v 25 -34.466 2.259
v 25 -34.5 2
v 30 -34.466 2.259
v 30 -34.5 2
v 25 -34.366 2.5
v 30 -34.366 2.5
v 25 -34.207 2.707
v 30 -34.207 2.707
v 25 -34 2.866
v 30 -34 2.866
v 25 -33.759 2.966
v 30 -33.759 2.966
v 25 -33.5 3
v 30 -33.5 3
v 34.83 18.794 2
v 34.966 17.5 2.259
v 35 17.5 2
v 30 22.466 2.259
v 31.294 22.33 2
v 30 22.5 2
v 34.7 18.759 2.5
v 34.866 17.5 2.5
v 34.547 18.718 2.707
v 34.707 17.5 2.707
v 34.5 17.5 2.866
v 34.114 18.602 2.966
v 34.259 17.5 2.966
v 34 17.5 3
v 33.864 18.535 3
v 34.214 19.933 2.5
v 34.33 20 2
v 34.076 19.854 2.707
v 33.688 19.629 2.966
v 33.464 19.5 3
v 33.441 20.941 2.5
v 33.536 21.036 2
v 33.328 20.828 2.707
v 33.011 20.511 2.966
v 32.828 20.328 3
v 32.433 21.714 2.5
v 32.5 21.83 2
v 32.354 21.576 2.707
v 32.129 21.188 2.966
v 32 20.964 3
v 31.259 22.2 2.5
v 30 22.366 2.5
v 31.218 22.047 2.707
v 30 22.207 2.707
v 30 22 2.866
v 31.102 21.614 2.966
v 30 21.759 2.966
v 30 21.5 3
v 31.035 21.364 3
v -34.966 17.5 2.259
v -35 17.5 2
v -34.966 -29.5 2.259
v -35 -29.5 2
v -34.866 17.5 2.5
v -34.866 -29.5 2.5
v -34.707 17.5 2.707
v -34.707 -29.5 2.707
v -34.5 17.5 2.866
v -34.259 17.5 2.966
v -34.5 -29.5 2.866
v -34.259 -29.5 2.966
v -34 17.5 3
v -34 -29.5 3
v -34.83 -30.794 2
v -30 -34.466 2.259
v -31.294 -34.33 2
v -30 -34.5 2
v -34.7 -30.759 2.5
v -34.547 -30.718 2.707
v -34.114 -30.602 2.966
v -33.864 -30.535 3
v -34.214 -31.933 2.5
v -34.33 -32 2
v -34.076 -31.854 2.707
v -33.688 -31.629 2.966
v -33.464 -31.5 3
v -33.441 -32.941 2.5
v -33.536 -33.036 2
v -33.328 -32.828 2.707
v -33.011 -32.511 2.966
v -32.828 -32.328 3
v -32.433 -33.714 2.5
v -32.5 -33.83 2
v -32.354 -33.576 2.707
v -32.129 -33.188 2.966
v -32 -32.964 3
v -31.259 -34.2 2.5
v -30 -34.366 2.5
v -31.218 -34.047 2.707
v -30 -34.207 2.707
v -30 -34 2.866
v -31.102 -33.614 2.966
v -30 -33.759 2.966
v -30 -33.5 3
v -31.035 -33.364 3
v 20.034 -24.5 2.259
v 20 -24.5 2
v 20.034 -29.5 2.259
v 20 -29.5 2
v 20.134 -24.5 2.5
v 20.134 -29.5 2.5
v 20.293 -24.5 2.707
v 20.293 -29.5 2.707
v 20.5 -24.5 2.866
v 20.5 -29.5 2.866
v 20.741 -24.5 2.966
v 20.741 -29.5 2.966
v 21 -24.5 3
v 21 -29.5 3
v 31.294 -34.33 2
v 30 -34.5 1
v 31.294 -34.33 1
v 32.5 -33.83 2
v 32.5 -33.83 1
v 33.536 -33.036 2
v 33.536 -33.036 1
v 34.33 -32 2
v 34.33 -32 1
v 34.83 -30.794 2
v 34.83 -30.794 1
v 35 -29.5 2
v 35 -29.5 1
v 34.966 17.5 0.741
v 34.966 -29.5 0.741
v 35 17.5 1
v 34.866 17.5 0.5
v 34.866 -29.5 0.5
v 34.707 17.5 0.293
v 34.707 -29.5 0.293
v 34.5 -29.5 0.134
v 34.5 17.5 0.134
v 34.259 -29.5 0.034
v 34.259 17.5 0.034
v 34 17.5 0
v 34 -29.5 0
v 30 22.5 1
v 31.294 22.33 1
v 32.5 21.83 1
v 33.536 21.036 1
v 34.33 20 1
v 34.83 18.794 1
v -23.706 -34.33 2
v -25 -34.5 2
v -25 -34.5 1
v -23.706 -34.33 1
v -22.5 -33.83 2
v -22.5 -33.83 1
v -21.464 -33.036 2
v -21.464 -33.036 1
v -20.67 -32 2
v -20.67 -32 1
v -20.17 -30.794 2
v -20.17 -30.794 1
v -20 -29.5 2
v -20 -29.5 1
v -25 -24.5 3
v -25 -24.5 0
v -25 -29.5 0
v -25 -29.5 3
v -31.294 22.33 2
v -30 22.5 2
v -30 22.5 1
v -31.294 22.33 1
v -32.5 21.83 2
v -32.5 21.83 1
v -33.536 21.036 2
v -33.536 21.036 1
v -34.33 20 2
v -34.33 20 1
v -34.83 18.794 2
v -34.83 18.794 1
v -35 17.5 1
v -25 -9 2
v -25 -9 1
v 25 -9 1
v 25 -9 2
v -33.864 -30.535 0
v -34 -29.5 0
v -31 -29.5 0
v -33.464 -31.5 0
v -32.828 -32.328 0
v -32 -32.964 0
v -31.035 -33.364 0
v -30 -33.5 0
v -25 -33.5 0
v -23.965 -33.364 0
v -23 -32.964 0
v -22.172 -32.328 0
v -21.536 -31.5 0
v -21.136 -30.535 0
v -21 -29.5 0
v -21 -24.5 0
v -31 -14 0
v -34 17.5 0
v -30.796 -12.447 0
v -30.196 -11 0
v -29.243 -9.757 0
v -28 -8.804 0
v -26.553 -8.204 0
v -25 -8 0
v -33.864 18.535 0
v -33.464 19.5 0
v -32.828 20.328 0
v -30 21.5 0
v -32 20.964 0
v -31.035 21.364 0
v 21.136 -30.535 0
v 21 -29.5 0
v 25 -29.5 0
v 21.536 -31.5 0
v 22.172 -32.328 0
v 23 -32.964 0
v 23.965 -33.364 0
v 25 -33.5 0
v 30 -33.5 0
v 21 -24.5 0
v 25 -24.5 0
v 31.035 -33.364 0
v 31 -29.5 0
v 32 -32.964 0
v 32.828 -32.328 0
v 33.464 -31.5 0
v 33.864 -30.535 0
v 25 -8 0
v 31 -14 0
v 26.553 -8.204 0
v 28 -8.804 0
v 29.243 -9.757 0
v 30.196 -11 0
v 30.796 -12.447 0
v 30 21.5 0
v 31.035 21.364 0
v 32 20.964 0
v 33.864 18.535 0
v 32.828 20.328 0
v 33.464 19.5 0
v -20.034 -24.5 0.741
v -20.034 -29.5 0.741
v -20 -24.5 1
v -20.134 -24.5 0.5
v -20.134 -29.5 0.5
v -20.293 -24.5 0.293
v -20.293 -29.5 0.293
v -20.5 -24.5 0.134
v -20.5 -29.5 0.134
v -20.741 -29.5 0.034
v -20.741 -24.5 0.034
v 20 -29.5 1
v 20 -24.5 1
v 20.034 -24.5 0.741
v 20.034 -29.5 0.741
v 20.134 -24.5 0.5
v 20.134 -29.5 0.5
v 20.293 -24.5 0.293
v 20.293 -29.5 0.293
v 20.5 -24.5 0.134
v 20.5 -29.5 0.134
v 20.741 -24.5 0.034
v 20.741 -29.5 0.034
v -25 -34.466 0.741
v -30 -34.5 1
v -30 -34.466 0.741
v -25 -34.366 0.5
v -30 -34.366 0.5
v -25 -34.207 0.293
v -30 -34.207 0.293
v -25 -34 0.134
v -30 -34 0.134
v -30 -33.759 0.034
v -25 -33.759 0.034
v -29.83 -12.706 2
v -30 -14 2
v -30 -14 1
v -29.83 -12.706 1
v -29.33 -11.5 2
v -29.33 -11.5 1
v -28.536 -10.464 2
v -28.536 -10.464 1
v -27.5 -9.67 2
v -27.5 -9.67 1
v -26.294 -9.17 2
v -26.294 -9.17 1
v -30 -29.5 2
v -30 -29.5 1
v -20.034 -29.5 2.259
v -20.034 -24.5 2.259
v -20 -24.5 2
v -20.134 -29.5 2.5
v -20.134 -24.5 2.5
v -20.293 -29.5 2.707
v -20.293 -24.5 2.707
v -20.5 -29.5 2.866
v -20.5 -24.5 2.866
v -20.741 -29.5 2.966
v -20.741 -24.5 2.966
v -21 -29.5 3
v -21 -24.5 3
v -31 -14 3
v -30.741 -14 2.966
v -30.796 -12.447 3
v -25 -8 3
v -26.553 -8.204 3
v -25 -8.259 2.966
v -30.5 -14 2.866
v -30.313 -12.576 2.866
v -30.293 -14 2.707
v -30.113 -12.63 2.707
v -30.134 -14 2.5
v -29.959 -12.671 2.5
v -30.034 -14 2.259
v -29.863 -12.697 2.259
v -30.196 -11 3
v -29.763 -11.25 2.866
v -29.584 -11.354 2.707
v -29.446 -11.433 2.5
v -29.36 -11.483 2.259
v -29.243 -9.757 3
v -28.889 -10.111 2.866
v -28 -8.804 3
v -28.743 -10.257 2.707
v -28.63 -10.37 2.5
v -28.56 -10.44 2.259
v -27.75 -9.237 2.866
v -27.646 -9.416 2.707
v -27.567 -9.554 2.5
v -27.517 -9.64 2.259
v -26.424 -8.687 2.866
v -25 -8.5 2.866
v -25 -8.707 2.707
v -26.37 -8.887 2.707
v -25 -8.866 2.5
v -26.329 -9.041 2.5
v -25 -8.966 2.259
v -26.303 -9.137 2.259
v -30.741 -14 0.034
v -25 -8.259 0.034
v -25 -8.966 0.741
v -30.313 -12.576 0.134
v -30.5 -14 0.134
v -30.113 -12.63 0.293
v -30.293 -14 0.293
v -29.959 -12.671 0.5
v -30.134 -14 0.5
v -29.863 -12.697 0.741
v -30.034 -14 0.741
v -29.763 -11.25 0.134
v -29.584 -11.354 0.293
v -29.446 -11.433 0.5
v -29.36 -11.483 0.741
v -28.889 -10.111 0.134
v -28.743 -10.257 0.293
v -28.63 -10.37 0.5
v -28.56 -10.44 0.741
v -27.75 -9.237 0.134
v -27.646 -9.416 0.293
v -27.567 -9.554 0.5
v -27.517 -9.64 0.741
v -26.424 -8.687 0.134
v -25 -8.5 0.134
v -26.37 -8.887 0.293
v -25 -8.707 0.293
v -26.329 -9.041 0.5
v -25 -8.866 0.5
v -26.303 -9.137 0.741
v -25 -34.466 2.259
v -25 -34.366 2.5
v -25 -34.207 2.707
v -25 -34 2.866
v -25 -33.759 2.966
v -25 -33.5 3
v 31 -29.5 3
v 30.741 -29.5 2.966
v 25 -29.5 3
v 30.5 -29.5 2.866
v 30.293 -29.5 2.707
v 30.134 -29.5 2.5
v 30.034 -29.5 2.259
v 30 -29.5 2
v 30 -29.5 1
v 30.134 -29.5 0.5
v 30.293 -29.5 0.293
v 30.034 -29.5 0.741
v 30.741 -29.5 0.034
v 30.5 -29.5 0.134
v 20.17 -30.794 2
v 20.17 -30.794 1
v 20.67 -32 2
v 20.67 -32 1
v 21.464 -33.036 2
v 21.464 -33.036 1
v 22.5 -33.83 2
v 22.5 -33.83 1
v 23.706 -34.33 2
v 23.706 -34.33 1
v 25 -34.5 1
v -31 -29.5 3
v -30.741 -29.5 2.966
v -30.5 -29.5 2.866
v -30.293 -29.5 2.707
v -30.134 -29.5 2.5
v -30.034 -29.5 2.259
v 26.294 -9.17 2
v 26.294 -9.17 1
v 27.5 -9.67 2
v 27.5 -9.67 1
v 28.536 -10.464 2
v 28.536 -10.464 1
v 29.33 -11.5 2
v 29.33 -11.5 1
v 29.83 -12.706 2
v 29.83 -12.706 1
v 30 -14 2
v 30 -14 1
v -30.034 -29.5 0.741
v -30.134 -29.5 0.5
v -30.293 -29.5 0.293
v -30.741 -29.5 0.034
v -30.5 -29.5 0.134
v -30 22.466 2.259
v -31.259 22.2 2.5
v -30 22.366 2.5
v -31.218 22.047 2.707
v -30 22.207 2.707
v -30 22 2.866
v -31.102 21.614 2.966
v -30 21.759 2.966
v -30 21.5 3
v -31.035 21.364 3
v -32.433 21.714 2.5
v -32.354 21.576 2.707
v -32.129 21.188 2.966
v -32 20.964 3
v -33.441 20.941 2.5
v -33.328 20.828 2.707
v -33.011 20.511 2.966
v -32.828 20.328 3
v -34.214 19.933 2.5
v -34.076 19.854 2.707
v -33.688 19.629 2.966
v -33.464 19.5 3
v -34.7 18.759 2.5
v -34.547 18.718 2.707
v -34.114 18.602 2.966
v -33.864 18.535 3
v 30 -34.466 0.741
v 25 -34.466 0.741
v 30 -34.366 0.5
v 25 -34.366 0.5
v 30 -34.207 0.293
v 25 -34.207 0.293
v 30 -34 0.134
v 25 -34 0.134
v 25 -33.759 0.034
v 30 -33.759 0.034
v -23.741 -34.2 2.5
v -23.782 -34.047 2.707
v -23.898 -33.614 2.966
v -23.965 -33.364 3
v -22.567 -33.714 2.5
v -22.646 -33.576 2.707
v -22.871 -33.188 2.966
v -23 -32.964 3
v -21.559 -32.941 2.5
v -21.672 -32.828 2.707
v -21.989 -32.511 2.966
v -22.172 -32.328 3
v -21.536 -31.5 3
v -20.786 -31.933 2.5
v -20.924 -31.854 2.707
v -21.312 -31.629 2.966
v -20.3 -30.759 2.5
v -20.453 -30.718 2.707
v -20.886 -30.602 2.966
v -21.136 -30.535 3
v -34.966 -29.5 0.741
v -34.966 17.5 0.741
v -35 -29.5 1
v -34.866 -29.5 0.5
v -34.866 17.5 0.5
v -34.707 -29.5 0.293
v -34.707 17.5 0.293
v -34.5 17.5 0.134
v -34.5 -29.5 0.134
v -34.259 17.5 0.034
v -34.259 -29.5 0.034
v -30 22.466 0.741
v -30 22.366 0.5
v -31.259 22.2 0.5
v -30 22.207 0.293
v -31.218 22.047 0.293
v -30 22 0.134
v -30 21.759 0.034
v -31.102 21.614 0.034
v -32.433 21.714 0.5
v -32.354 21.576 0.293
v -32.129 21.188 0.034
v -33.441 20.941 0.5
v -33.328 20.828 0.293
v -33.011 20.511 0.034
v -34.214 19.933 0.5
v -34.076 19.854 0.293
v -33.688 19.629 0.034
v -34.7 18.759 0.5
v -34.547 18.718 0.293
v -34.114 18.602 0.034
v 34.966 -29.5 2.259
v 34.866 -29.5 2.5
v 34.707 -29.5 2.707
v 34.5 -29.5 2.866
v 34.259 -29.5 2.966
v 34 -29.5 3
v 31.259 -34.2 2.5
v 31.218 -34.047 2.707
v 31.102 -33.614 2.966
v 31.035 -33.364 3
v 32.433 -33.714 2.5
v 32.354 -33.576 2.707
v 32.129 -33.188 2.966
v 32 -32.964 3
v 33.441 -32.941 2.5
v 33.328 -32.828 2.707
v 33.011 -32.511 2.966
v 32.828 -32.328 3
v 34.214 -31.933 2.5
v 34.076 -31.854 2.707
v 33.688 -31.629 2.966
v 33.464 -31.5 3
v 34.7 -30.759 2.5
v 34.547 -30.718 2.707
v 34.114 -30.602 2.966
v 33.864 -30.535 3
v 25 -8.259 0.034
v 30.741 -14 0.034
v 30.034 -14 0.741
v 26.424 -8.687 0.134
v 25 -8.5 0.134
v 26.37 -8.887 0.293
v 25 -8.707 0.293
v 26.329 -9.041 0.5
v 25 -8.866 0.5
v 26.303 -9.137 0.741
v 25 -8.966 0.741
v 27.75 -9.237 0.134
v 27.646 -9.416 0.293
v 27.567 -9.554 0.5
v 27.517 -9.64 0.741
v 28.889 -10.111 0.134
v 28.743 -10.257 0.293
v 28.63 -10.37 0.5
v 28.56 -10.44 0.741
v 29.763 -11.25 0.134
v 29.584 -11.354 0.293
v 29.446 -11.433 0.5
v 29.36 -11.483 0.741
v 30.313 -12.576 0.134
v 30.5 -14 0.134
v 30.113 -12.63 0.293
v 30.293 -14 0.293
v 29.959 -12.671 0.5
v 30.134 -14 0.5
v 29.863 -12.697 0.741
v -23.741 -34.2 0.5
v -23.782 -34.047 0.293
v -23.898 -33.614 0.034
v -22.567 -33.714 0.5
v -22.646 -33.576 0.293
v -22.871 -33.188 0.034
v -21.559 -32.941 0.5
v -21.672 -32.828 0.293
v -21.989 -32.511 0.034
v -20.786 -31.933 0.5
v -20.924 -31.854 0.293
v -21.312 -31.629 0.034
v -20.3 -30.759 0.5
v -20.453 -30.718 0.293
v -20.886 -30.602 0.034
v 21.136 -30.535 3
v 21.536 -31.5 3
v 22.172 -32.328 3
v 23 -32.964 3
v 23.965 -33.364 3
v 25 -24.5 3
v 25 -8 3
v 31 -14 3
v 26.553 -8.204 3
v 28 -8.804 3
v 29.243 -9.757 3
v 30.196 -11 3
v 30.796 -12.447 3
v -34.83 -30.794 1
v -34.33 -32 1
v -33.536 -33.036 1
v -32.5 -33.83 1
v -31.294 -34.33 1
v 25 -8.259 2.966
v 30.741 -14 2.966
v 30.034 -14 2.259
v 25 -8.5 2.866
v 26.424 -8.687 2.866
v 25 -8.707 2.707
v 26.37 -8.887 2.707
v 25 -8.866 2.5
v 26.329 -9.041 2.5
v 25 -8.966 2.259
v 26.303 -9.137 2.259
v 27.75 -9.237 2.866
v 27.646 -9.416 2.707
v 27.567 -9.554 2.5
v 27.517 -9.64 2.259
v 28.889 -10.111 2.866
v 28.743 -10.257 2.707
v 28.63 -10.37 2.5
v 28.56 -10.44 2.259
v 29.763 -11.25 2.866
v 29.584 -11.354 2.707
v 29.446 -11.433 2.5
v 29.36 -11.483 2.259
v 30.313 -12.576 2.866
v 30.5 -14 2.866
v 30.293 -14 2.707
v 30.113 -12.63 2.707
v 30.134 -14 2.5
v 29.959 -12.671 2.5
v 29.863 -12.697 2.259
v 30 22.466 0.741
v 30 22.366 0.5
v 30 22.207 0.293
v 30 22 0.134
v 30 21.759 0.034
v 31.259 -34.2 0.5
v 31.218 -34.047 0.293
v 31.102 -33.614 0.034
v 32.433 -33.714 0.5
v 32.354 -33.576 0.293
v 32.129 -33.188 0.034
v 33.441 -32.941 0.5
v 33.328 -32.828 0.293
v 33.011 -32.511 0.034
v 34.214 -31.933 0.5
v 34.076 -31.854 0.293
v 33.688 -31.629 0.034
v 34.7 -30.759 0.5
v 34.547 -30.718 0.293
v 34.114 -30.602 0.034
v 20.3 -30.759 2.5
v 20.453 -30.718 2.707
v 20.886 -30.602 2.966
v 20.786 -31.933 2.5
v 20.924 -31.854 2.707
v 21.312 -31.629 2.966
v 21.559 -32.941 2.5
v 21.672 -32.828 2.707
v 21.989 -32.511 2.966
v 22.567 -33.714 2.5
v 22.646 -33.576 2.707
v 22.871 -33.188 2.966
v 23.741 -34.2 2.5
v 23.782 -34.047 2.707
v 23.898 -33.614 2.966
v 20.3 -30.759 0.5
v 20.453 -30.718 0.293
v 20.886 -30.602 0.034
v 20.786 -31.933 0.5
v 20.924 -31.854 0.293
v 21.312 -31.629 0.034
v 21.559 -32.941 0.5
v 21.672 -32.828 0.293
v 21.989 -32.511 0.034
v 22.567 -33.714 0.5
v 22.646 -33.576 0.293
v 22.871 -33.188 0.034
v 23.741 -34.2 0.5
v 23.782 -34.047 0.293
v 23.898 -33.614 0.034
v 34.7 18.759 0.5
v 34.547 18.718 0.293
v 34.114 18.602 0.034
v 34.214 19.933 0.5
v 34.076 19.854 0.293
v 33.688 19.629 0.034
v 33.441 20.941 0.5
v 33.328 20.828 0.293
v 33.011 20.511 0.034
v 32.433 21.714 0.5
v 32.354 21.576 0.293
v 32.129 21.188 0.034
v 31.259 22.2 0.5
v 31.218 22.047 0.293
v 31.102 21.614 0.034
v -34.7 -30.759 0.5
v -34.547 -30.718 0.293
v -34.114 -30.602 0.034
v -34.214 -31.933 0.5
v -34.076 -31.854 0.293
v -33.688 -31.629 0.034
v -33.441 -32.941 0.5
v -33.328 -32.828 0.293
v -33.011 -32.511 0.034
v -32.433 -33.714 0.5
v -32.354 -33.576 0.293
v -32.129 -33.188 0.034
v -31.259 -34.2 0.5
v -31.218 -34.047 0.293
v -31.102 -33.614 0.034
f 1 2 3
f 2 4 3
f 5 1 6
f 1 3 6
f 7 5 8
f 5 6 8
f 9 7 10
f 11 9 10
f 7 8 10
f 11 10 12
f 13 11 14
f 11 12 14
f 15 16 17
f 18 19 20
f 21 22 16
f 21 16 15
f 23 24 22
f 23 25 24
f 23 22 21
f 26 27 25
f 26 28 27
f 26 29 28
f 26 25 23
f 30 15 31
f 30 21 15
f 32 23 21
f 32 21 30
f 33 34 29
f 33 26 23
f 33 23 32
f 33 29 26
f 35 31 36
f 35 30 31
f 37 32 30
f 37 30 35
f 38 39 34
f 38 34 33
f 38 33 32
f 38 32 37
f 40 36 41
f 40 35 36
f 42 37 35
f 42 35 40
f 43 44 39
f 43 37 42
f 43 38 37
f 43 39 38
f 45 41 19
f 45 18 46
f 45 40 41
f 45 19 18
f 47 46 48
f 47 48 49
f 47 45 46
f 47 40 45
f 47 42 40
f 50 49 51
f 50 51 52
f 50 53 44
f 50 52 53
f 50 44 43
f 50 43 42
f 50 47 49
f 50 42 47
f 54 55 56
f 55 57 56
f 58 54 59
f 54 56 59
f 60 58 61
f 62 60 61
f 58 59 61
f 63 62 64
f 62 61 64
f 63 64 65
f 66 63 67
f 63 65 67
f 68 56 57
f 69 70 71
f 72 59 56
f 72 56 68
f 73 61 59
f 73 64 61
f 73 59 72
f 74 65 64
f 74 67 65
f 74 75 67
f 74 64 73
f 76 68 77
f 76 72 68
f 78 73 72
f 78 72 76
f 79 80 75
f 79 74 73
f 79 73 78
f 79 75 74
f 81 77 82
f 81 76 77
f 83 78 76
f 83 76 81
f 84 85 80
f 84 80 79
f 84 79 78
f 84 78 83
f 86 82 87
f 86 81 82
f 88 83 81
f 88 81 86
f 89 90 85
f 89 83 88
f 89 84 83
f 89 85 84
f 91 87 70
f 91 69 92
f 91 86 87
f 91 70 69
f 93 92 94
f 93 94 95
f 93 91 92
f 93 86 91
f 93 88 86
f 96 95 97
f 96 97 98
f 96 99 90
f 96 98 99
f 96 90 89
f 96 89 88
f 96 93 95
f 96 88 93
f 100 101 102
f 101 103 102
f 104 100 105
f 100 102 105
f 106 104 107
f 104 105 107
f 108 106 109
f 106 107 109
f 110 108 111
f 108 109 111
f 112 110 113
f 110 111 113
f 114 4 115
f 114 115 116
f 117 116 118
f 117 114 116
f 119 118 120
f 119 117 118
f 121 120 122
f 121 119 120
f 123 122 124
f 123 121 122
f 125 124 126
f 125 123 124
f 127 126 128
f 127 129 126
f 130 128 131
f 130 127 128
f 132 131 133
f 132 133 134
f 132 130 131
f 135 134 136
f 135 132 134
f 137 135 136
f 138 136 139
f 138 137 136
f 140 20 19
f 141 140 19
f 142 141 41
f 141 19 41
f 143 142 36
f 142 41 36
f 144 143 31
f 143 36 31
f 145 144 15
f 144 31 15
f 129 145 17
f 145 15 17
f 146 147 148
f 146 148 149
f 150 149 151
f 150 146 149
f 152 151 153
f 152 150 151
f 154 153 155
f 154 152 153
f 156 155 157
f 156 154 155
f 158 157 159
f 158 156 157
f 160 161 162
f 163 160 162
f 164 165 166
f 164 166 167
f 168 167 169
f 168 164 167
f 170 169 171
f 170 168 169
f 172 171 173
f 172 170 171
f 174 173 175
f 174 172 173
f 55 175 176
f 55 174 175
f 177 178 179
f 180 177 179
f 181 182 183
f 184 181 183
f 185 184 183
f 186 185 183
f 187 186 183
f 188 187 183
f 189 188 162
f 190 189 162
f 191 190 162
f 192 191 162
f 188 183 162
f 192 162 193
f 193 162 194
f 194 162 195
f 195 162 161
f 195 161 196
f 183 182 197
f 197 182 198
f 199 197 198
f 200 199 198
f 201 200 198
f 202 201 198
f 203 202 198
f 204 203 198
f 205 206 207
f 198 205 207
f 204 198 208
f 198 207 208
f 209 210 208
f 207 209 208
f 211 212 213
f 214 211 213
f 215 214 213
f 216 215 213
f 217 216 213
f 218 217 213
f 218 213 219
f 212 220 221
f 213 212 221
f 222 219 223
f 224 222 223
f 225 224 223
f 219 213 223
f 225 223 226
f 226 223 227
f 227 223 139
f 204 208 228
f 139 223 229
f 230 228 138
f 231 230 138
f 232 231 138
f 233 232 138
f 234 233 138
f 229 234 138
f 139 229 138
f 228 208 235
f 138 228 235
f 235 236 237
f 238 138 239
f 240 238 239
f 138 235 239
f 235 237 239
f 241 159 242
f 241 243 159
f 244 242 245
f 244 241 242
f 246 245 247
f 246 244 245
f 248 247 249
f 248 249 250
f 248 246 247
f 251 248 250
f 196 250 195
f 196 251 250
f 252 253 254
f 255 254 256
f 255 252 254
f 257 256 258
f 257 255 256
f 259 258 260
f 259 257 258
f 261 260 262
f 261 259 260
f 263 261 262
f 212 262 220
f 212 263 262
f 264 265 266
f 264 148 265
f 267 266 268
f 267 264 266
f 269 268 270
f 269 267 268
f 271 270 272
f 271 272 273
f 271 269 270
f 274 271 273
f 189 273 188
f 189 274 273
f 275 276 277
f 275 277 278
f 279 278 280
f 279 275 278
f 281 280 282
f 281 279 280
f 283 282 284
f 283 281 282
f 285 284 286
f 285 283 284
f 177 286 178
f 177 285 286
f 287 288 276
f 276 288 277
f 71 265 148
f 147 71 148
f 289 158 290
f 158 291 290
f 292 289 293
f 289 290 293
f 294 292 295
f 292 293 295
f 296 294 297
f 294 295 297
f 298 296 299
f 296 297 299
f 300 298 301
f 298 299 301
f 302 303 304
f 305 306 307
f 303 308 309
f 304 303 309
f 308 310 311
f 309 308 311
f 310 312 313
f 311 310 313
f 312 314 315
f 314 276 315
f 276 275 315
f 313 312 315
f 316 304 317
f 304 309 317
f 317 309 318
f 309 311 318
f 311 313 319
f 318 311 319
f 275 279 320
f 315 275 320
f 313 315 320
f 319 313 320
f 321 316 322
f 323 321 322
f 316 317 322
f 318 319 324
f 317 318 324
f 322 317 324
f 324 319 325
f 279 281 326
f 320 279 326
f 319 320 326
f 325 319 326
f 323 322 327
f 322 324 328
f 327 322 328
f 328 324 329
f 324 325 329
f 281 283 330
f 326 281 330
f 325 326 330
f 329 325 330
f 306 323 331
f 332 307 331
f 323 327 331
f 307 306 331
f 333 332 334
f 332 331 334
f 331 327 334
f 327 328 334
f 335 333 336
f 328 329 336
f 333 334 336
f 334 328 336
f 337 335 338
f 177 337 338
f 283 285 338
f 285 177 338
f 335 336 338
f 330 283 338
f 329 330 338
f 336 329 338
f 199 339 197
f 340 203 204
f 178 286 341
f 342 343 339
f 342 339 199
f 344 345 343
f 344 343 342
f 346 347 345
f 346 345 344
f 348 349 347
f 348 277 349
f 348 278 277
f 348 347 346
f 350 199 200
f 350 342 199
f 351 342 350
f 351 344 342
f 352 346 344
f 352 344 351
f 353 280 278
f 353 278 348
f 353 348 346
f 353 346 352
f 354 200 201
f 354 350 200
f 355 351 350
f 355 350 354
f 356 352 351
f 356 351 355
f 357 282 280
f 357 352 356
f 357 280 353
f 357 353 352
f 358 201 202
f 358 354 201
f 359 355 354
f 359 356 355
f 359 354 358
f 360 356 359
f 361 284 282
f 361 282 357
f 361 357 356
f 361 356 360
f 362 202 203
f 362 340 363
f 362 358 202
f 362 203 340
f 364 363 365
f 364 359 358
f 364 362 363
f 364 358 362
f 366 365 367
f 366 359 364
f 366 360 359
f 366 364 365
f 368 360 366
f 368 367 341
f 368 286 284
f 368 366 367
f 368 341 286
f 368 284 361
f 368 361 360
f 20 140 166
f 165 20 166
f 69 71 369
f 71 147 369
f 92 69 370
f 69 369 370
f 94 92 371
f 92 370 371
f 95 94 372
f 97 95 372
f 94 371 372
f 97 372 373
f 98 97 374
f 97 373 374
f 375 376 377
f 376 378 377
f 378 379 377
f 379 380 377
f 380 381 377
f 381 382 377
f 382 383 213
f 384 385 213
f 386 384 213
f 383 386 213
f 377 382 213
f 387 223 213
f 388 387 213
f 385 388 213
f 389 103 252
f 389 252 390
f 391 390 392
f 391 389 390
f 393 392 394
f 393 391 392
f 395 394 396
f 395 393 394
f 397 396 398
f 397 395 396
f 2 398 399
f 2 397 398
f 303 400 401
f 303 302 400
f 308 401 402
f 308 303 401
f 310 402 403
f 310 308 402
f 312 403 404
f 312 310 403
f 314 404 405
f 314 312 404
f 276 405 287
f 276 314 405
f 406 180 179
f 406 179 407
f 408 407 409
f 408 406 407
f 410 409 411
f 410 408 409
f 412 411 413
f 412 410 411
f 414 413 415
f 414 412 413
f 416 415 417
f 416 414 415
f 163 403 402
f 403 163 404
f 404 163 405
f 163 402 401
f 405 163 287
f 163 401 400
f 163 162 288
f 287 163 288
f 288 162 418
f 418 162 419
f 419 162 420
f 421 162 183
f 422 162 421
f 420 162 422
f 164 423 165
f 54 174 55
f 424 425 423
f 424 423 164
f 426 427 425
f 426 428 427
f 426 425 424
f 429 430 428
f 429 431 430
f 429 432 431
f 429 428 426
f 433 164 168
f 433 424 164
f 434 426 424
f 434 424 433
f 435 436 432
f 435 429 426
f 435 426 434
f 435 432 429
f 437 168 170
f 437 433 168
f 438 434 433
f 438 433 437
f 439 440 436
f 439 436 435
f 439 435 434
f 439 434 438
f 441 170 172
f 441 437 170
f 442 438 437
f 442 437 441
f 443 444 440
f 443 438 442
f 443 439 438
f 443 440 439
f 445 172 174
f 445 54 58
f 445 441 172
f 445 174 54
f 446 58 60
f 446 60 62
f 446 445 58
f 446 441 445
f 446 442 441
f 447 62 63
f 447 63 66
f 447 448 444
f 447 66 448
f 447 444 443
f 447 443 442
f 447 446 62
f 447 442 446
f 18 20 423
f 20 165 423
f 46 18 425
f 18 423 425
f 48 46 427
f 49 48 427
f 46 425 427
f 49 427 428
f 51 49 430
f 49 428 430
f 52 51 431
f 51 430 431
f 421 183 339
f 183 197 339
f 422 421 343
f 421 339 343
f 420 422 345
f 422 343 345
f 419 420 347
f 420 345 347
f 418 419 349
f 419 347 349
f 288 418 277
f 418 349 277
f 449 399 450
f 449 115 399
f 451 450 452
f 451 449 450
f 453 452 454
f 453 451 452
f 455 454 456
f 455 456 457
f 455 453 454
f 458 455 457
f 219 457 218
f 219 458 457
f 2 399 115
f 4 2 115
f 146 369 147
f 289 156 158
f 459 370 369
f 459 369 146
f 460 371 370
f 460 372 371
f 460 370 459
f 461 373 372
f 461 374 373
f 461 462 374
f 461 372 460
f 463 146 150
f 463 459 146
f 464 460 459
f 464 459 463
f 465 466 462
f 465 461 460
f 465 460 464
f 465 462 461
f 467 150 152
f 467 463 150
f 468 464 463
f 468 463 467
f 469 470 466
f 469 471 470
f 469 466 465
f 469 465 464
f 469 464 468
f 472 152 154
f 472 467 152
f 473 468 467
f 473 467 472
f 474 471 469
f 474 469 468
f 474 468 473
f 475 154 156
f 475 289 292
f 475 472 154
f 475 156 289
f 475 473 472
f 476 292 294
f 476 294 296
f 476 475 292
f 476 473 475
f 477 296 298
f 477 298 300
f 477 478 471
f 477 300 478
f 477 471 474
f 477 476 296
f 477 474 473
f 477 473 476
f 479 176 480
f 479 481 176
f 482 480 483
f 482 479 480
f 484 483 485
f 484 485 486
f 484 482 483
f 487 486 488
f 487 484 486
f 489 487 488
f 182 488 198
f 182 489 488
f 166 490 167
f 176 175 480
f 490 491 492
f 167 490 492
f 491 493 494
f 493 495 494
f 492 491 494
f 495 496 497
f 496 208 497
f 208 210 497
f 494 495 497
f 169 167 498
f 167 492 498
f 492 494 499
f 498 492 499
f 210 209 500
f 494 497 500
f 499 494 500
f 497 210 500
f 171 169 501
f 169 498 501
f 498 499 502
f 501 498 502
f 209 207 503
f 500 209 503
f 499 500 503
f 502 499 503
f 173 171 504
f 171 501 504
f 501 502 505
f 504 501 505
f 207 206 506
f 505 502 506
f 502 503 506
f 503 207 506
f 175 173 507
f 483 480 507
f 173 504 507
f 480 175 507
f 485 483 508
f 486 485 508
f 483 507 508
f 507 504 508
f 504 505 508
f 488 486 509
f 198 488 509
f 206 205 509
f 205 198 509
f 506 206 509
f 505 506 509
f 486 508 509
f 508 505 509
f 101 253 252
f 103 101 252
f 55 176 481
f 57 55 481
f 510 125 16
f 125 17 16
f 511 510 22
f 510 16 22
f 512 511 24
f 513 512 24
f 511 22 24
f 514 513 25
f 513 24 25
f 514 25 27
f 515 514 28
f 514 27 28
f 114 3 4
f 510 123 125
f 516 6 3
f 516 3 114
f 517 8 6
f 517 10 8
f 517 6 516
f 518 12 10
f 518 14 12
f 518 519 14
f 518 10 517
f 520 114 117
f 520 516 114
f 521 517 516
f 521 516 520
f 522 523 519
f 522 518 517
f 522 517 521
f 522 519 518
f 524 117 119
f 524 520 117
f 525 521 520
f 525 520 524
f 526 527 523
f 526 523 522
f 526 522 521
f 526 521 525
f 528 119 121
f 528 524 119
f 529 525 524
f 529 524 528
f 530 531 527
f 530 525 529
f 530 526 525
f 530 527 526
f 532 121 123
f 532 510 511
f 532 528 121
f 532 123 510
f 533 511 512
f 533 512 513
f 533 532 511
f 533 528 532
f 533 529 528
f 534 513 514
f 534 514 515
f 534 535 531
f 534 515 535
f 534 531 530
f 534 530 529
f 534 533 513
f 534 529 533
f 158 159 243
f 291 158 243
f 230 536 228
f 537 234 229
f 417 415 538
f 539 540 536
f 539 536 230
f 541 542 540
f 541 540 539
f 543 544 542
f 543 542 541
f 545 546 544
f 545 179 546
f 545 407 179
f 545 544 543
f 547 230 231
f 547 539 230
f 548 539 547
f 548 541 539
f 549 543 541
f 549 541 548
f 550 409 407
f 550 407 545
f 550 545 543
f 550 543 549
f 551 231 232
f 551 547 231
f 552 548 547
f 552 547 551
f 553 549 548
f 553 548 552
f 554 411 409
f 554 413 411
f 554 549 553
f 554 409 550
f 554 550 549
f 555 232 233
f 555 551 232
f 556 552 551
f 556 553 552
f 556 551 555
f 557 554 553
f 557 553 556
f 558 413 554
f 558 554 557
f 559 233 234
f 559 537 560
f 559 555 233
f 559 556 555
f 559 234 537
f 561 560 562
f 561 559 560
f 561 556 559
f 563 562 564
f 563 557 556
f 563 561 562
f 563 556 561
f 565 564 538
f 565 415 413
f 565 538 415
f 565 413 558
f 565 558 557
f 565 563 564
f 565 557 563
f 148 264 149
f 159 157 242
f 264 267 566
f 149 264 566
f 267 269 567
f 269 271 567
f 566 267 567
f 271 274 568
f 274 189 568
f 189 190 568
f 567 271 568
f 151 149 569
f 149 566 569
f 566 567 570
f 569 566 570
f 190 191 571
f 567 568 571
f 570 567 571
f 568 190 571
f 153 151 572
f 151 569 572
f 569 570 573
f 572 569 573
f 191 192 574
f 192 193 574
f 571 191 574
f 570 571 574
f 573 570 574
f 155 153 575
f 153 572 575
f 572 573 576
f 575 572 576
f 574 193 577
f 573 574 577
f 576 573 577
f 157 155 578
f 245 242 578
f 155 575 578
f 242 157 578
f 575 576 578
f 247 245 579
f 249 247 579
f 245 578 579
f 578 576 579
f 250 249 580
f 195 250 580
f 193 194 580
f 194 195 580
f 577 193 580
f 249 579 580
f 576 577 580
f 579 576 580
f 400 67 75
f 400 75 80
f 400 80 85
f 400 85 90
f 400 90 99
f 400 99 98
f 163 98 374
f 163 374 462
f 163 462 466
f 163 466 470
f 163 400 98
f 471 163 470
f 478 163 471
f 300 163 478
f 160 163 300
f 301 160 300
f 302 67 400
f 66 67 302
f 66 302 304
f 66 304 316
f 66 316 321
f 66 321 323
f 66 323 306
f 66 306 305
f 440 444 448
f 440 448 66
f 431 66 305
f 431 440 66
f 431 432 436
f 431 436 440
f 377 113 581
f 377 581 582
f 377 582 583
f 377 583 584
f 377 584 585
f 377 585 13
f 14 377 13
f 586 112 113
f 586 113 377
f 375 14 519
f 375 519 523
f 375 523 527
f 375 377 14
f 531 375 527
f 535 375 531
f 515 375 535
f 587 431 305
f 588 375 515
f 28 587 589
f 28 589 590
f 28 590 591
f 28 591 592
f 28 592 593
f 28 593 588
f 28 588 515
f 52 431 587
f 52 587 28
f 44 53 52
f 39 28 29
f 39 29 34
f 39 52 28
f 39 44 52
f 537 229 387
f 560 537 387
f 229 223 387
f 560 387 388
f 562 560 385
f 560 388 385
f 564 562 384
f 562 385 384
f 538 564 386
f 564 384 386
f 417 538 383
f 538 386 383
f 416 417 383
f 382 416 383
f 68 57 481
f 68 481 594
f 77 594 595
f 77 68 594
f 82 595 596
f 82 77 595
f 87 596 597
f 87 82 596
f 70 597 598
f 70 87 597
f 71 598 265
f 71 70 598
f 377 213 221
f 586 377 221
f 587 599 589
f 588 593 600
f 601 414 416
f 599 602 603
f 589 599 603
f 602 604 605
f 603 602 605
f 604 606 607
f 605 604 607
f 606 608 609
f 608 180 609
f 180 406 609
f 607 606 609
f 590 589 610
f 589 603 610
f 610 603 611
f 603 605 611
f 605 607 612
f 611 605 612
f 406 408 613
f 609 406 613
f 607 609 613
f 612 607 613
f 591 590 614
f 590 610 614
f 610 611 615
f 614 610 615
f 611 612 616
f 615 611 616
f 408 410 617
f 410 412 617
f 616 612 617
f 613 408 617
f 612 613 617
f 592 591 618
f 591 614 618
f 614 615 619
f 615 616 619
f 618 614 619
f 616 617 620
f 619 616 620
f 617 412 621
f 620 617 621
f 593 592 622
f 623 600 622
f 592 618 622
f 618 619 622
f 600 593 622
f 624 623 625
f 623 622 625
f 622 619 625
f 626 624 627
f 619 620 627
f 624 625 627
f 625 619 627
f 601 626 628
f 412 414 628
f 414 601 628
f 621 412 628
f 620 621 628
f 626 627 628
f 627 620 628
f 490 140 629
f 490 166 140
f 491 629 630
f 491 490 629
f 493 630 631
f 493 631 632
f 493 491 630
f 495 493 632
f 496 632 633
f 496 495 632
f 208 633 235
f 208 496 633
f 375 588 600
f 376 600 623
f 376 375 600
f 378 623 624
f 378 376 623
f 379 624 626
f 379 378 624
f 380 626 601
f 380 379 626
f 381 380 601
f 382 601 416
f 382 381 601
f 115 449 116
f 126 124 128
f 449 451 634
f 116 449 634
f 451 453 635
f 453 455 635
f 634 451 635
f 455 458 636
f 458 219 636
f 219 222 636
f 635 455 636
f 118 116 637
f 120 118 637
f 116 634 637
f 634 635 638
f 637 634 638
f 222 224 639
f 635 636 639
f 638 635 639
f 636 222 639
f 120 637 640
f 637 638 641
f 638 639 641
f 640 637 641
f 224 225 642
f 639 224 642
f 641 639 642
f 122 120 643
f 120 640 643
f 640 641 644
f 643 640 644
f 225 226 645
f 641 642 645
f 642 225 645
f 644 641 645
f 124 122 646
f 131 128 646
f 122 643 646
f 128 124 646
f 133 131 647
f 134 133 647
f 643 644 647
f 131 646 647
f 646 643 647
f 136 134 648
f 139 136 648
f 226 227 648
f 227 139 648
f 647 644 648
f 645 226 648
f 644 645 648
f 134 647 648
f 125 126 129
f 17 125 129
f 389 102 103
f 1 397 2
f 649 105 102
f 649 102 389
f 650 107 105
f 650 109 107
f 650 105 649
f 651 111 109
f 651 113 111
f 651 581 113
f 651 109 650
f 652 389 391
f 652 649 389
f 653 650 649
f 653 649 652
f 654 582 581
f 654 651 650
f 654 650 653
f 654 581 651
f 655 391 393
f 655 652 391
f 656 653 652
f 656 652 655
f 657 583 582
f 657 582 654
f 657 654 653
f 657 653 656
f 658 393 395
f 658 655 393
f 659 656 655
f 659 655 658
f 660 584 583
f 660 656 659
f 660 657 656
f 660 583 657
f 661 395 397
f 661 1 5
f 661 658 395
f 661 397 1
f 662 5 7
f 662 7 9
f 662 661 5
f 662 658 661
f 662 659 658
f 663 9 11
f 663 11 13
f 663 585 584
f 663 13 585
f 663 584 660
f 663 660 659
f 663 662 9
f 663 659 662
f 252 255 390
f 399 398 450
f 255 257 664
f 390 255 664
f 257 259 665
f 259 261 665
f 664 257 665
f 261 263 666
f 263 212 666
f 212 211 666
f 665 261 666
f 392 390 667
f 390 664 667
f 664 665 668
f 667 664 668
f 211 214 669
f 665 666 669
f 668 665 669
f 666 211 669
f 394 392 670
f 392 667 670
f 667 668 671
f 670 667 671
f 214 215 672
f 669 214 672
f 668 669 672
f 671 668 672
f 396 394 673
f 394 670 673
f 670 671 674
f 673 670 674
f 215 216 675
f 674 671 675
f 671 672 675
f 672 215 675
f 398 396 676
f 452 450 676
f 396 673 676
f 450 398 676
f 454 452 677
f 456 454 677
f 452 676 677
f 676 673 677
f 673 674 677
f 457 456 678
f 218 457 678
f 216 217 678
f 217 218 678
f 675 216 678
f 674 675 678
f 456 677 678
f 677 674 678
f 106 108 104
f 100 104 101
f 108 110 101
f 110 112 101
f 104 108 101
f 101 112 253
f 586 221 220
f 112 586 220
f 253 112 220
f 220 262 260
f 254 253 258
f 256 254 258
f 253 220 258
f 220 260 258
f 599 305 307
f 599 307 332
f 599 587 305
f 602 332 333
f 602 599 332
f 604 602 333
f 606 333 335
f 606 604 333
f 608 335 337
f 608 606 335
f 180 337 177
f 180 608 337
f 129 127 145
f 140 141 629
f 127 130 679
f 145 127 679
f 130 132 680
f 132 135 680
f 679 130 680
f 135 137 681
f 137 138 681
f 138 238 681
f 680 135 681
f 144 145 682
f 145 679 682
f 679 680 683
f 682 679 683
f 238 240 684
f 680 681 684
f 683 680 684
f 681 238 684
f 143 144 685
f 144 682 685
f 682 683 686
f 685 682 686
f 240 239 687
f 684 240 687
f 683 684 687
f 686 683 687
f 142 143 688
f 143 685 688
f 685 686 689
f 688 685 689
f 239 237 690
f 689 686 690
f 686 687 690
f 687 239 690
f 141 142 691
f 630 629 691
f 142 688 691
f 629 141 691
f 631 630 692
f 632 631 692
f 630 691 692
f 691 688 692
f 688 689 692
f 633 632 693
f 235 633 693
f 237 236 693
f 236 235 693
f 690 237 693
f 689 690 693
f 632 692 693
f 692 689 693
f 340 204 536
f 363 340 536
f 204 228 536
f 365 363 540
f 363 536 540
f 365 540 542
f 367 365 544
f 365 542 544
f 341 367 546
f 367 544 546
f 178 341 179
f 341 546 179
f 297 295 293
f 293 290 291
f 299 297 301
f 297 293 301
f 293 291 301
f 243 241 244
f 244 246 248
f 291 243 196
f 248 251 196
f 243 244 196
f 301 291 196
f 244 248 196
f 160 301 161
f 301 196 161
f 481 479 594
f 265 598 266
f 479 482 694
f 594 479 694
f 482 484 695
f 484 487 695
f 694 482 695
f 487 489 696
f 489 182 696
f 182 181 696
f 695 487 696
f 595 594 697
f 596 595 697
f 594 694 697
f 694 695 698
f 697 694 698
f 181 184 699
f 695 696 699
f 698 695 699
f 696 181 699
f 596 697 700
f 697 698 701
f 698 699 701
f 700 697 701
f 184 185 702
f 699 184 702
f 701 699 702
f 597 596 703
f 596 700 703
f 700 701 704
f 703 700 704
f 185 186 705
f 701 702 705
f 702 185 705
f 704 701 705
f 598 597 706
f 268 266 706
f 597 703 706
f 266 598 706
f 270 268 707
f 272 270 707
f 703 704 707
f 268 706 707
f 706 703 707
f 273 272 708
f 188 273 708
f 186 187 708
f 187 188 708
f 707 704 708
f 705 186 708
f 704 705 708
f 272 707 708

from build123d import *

# Parameters (mm, degrees)
F1_DEPTH = 3
F2_R     = 5
F3_R     = 1


with BuildPart() as f1:
    # F0 (on Top) → F1 (new body)
    with BuildSketch(Plane.XY):
        Polygon((35, -22.5), (35, 22.5), (-35, 22.5), (-35, -22.5), (-35, -34.5), (-20, -34.5), (-20, -24.5), (-25, -24.5), (-25, -29.5), (-30, -29.5), (-30, -9), (30, -9), (30, -29.5), (25, -29.5), (25, -24.5), (20, -24.5), (20, -34.5), (35, -34.5), align=None)
    extrude(amount=F1_DEPTH)

    # F2
    f2_edges = [f1.edges().sort_by_distance(p)[0] for p in [
        (-35, -34.5, 1.5),
        (-20, -34.5, 1.5),
        (-30, -9, 1.5),
        (35, -34.5, 1.5),
        (20, -34.5, 1.5),
        (35, 22.5, 1.5),
        (-35, 22.5, 1.5),
        (30, -9, 1.5),
    ]]
    fillet(f2_edges, radius=F2_R)

    # F3
    f3_edges = [f1.edges().sort_by_distance(p)[0] for p in [
        (0, 22.5, 3),
        (0, 22.5, 0),
        (0, -9, 3),
        (30, -21.75, 3),
        (0, -9, 0),
        (30, -21.75, 0),
    ]]
    fillet(f3_edges, radius=F3_R)


solid = f1.part
